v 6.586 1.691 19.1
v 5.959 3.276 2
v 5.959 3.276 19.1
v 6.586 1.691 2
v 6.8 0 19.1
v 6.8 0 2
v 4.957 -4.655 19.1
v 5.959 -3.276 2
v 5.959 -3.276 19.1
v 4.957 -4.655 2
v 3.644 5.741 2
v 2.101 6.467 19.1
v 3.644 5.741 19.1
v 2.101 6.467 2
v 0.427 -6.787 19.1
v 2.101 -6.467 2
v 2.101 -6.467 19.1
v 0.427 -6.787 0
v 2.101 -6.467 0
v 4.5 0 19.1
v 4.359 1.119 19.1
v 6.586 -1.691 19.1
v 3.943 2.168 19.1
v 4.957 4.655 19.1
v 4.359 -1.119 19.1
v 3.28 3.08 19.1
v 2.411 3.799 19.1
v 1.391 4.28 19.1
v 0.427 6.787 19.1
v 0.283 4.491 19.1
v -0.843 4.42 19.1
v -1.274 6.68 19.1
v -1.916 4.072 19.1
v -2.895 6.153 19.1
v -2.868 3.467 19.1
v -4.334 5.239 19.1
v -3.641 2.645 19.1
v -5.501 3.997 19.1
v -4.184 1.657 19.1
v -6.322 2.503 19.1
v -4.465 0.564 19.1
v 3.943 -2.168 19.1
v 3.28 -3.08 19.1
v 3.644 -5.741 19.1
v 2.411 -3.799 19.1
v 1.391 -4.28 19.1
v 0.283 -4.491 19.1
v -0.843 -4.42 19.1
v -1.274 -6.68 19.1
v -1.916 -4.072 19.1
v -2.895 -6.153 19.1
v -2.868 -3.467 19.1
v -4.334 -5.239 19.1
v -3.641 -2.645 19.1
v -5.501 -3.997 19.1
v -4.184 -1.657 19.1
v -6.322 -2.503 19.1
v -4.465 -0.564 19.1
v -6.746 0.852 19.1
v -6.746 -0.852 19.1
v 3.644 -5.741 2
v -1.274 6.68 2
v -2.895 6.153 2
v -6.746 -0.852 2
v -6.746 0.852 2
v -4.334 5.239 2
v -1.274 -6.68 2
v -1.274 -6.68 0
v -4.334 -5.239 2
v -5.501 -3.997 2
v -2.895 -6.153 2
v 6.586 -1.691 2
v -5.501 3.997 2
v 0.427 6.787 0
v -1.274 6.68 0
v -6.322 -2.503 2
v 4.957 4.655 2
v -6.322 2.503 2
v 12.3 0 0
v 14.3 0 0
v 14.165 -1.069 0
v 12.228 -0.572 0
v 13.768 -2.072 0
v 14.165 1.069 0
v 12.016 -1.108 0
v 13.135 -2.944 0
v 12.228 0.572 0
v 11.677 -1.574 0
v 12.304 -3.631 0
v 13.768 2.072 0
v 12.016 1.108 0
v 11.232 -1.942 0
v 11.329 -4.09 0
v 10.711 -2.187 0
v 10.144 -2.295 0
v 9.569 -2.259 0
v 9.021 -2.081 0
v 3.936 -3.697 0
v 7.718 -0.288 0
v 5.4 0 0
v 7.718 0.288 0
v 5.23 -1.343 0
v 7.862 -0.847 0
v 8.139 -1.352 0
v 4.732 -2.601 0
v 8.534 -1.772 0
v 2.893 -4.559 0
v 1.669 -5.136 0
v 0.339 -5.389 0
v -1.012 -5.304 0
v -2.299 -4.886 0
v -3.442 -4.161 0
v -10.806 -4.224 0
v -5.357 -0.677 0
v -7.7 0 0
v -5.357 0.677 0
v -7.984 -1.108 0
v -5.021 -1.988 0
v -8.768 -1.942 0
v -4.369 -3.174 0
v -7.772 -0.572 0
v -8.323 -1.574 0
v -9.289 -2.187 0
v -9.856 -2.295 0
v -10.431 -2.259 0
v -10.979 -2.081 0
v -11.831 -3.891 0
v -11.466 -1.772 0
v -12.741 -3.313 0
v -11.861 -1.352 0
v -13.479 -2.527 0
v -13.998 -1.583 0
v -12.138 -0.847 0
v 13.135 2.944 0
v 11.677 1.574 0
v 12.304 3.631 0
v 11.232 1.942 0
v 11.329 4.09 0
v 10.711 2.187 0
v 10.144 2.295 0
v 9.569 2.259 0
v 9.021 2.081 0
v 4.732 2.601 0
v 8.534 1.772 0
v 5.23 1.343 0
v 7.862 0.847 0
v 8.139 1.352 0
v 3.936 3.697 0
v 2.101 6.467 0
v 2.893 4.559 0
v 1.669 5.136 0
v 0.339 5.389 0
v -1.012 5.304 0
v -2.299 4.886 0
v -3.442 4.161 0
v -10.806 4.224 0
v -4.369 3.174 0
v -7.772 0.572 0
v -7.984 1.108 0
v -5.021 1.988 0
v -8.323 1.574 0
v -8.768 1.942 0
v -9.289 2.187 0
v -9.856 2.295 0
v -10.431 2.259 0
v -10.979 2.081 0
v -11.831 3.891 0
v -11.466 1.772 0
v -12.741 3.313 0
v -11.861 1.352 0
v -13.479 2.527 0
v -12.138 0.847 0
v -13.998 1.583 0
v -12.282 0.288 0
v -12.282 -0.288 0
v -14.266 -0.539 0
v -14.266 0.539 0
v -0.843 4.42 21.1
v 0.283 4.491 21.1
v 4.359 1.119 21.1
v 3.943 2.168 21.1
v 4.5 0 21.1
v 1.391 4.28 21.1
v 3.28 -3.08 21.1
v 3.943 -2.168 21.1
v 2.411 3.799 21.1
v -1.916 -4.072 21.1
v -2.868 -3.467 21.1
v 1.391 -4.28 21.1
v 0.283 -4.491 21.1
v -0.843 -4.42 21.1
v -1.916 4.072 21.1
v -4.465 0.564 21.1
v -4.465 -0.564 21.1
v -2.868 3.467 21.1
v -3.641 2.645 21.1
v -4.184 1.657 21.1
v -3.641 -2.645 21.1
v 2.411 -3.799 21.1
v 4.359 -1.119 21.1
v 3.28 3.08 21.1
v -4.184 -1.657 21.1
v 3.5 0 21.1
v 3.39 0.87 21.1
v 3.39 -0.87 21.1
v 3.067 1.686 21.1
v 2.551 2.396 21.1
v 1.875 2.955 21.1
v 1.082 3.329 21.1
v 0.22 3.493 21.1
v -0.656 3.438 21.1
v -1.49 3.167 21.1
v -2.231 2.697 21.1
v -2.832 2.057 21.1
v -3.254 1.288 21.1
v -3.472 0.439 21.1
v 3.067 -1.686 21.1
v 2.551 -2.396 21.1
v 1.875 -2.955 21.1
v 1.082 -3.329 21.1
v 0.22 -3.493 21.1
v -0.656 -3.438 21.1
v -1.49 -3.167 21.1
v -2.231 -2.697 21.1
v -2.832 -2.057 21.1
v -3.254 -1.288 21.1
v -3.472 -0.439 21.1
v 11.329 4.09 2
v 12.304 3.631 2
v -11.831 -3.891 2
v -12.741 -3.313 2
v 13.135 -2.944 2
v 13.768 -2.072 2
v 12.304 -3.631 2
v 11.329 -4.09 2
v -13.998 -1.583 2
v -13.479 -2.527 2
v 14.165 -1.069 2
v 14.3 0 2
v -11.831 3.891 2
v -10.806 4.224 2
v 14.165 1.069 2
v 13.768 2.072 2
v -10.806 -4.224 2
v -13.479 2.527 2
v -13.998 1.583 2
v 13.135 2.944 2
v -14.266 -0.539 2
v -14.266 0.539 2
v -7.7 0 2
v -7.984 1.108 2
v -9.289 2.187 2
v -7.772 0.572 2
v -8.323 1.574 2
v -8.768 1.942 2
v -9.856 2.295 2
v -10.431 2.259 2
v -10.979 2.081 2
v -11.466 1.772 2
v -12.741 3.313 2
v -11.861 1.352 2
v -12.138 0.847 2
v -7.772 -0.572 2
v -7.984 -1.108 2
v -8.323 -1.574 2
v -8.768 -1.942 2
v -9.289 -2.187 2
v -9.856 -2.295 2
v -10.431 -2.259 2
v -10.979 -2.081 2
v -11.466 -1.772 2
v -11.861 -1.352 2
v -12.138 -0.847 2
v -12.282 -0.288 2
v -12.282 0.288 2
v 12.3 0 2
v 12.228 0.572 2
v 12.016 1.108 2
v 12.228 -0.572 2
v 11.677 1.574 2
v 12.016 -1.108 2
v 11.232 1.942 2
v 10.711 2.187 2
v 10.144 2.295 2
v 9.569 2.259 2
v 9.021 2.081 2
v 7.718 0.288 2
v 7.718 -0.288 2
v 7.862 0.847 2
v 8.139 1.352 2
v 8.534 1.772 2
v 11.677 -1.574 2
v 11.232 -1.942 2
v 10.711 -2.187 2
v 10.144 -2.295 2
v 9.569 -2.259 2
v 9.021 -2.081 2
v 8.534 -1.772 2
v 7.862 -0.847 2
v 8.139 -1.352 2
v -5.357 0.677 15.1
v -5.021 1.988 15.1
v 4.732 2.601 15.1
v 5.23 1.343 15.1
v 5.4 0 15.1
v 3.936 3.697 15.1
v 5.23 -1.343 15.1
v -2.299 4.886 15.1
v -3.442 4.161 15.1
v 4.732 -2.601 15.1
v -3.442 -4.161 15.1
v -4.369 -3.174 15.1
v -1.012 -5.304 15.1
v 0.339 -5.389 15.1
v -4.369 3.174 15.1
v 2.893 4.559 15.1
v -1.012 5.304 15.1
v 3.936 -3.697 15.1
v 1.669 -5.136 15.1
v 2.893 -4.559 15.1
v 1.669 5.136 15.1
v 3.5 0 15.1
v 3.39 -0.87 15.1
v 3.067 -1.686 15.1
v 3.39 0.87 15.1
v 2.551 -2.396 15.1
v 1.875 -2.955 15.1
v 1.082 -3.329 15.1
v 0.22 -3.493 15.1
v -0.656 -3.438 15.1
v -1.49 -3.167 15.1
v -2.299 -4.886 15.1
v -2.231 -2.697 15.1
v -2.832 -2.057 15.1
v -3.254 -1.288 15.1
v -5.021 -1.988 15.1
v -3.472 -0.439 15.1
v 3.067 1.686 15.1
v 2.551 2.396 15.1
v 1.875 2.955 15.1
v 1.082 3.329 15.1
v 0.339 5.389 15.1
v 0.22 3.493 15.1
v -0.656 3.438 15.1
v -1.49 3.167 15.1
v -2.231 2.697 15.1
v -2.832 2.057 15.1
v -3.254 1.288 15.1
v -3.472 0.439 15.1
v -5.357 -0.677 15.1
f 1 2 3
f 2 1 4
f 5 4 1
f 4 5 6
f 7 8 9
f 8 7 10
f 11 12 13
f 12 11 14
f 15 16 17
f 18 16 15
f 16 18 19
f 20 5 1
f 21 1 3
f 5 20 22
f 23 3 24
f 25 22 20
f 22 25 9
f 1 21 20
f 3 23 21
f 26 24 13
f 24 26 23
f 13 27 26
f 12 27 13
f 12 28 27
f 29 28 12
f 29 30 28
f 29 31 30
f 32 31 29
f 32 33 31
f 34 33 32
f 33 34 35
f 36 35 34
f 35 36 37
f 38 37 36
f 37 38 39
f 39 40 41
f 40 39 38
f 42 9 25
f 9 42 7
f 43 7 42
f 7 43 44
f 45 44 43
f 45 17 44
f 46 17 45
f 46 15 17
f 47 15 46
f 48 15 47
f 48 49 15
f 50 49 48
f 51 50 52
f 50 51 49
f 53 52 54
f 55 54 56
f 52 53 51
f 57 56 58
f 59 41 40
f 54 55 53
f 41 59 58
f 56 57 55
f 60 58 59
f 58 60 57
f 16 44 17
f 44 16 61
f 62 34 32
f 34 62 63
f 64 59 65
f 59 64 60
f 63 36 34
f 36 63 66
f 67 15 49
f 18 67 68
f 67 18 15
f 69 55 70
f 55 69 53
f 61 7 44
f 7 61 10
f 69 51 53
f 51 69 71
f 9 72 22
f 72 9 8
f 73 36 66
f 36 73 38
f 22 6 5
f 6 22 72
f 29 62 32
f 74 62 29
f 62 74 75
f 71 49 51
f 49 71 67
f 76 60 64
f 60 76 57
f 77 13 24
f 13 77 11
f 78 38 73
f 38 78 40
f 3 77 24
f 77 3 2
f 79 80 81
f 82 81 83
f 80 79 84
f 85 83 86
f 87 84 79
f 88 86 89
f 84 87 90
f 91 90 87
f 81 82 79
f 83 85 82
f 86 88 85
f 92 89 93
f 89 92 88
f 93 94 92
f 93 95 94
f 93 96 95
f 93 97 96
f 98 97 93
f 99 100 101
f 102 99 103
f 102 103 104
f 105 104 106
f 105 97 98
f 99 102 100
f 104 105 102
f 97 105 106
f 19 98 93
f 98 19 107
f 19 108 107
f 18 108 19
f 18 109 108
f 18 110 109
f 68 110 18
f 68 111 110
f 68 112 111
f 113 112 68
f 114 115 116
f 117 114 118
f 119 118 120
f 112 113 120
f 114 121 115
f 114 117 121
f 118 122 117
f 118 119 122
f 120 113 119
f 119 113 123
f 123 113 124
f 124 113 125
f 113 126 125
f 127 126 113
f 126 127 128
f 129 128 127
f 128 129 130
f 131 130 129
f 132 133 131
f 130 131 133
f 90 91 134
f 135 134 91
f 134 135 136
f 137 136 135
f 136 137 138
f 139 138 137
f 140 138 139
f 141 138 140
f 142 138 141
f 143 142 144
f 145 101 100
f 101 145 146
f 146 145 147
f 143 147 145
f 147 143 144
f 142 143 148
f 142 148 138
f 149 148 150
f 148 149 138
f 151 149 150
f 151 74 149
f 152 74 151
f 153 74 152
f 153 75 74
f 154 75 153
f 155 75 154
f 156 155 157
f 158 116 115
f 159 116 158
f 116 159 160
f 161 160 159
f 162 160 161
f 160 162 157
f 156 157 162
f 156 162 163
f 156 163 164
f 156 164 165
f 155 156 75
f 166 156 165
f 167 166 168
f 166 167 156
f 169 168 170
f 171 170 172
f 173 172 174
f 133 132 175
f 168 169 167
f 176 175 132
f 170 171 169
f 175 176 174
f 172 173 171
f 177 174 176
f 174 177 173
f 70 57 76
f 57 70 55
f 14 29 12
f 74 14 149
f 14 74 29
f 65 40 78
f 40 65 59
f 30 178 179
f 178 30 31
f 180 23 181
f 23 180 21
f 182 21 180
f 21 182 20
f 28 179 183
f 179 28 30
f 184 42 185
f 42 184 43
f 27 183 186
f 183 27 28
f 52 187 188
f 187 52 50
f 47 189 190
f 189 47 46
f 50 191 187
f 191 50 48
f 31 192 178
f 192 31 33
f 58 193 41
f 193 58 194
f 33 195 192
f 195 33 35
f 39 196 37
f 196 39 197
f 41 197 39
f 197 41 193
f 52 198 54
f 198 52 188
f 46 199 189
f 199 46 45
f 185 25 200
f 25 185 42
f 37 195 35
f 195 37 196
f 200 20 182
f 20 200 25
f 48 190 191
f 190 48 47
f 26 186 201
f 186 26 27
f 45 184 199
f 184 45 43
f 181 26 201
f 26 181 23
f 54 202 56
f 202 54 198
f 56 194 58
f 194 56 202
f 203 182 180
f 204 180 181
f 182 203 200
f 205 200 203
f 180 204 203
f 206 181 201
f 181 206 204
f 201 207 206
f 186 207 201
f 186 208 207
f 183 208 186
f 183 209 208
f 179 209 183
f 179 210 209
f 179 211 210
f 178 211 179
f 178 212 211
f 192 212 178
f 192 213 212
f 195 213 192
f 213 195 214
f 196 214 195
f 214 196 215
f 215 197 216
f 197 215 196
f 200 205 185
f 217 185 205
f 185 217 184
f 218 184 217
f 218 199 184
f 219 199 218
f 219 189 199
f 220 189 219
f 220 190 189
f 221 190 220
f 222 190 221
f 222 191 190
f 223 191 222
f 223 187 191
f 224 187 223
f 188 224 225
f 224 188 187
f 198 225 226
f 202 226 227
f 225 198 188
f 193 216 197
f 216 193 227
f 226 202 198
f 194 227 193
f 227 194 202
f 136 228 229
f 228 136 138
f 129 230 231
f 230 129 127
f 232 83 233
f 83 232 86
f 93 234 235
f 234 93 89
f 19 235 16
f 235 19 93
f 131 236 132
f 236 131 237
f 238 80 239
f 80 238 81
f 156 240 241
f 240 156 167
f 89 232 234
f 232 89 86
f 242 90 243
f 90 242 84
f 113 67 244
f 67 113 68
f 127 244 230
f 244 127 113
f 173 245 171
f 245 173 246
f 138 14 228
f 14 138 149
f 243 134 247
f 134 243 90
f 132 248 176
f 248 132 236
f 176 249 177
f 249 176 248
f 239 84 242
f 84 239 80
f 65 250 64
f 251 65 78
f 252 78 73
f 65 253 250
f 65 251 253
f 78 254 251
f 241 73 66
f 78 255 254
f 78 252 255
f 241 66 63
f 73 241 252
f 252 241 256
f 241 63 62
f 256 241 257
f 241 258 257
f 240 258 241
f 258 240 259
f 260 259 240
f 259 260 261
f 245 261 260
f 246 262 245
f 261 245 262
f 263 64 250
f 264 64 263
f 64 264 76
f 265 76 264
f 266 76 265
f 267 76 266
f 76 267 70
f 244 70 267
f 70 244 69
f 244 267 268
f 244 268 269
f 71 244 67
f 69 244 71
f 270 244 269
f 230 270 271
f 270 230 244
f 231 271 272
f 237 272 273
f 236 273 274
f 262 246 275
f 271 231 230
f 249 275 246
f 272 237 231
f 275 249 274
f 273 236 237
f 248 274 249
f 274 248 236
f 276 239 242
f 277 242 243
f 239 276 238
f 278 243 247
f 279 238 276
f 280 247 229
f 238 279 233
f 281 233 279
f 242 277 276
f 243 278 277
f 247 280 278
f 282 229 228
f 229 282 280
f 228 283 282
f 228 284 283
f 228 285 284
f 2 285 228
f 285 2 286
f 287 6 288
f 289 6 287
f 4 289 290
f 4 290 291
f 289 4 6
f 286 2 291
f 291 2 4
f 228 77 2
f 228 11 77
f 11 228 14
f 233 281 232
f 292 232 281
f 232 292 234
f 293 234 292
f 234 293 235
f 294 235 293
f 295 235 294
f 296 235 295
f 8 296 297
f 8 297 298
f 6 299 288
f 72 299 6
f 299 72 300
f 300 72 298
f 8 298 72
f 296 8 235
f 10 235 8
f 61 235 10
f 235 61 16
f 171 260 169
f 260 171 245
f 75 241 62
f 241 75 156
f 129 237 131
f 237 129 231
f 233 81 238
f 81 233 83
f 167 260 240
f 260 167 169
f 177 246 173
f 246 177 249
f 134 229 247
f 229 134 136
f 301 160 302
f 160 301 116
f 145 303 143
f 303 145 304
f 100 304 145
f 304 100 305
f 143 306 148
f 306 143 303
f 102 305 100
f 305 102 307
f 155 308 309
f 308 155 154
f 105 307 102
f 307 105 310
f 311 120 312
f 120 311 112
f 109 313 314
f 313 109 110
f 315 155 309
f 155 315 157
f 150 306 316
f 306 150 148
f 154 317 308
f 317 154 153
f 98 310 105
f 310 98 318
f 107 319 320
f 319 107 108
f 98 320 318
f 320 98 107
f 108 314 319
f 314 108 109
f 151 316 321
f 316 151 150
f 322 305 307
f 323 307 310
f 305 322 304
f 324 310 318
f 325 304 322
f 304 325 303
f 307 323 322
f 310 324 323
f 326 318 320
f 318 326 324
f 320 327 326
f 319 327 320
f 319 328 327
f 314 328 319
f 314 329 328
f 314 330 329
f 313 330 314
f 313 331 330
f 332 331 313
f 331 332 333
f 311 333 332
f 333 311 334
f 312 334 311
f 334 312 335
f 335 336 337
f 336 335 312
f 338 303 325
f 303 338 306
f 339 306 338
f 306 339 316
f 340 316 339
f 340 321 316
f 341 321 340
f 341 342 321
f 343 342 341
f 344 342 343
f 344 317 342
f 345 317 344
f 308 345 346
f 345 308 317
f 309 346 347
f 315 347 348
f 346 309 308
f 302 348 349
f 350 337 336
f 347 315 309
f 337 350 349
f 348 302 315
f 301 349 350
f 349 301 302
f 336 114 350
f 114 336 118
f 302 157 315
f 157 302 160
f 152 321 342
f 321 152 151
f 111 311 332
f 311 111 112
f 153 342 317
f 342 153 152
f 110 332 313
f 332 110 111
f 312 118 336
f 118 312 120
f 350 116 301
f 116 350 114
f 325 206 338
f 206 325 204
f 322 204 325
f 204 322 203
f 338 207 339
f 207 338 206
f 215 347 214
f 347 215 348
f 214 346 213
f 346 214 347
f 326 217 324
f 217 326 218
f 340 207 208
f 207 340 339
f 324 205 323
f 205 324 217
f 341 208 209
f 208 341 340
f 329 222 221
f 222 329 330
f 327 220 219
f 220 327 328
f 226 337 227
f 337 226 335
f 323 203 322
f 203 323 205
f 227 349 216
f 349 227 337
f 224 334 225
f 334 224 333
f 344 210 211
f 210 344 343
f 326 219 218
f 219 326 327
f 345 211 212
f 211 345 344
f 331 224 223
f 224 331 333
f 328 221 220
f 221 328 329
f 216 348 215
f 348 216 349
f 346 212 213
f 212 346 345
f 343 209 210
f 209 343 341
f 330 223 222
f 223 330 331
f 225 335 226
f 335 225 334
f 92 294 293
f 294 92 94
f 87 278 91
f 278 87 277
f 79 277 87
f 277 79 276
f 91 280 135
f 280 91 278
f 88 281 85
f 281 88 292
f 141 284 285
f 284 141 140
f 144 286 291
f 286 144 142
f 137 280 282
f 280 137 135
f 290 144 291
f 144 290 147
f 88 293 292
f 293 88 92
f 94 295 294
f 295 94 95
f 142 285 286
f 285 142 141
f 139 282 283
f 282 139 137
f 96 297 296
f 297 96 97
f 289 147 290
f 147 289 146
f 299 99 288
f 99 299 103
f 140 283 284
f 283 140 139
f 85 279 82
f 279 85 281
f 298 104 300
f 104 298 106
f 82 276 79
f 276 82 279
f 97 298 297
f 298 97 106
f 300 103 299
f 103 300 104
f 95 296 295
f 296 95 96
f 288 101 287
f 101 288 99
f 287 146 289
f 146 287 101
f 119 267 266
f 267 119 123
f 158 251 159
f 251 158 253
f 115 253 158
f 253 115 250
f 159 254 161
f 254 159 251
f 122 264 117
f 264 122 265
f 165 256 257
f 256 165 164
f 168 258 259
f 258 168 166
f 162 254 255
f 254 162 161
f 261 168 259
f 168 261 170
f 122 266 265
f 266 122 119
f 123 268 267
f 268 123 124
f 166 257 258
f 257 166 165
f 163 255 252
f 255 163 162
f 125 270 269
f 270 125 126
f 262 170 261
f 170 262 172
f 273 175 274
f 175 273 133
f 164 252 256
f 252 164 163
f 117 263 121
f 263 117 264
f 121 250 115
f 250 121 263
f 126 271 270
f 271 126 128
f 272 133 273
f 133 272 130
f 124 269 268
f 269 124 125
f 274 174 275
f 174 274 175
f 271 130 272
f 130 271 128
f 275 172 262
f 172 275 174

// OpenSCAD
// holder for linear bearing D_in=5mm, L=15mm. Floor mounting
d_in  =  5.0; // inner diameter (pure)
d_out = 10.0; // outer diameter
L_all = 15.1; //

r1   = d_out / 2 + 0.4;
r_e  = r1 + 1.4;
r_in = d_in  / 2 + 1.0;
r_h  = 4.0 / 2 + 0.3;

// include <atu_supports.scad>
// include <atu_nut_axis.scad>

xh = 10.0; // to mounting holes

zw = 2.0;
zb = 2.0;
ze = 2.0;
za = L_all + zw + ze;

$fn=25;


module lbe_ho_5x15_floor()
{
  difference() {
    union() {
      cylinder( r=r_e, h=za );
      #translate( [0,0,za]) cylinder( r=r_in+1.0, h=ze );
      hull() {
        cylinder( r=r_e, h=zb );
        translate( [ xh,0,0] ) cylinder( r=r_h+2.0, h=zb );
        translate( [-xh,0,0] ) cylinder( r=r_h+2.0, h=zb );
      }
    }
    cylinder( r=r1, h=L_all );
    cylinder( r=r_in, h=za+zw );
    translate( [ xh,0,0] ) cylinder( r=r_h, h=zb );
    translate( [-xh,0,0] ) cylinder( r=r_h, h=zb );
  }
  
}

lbe_ho_5x15_floor();
// rotate([180,0,0]) lbe_ho_5x15_floor();
